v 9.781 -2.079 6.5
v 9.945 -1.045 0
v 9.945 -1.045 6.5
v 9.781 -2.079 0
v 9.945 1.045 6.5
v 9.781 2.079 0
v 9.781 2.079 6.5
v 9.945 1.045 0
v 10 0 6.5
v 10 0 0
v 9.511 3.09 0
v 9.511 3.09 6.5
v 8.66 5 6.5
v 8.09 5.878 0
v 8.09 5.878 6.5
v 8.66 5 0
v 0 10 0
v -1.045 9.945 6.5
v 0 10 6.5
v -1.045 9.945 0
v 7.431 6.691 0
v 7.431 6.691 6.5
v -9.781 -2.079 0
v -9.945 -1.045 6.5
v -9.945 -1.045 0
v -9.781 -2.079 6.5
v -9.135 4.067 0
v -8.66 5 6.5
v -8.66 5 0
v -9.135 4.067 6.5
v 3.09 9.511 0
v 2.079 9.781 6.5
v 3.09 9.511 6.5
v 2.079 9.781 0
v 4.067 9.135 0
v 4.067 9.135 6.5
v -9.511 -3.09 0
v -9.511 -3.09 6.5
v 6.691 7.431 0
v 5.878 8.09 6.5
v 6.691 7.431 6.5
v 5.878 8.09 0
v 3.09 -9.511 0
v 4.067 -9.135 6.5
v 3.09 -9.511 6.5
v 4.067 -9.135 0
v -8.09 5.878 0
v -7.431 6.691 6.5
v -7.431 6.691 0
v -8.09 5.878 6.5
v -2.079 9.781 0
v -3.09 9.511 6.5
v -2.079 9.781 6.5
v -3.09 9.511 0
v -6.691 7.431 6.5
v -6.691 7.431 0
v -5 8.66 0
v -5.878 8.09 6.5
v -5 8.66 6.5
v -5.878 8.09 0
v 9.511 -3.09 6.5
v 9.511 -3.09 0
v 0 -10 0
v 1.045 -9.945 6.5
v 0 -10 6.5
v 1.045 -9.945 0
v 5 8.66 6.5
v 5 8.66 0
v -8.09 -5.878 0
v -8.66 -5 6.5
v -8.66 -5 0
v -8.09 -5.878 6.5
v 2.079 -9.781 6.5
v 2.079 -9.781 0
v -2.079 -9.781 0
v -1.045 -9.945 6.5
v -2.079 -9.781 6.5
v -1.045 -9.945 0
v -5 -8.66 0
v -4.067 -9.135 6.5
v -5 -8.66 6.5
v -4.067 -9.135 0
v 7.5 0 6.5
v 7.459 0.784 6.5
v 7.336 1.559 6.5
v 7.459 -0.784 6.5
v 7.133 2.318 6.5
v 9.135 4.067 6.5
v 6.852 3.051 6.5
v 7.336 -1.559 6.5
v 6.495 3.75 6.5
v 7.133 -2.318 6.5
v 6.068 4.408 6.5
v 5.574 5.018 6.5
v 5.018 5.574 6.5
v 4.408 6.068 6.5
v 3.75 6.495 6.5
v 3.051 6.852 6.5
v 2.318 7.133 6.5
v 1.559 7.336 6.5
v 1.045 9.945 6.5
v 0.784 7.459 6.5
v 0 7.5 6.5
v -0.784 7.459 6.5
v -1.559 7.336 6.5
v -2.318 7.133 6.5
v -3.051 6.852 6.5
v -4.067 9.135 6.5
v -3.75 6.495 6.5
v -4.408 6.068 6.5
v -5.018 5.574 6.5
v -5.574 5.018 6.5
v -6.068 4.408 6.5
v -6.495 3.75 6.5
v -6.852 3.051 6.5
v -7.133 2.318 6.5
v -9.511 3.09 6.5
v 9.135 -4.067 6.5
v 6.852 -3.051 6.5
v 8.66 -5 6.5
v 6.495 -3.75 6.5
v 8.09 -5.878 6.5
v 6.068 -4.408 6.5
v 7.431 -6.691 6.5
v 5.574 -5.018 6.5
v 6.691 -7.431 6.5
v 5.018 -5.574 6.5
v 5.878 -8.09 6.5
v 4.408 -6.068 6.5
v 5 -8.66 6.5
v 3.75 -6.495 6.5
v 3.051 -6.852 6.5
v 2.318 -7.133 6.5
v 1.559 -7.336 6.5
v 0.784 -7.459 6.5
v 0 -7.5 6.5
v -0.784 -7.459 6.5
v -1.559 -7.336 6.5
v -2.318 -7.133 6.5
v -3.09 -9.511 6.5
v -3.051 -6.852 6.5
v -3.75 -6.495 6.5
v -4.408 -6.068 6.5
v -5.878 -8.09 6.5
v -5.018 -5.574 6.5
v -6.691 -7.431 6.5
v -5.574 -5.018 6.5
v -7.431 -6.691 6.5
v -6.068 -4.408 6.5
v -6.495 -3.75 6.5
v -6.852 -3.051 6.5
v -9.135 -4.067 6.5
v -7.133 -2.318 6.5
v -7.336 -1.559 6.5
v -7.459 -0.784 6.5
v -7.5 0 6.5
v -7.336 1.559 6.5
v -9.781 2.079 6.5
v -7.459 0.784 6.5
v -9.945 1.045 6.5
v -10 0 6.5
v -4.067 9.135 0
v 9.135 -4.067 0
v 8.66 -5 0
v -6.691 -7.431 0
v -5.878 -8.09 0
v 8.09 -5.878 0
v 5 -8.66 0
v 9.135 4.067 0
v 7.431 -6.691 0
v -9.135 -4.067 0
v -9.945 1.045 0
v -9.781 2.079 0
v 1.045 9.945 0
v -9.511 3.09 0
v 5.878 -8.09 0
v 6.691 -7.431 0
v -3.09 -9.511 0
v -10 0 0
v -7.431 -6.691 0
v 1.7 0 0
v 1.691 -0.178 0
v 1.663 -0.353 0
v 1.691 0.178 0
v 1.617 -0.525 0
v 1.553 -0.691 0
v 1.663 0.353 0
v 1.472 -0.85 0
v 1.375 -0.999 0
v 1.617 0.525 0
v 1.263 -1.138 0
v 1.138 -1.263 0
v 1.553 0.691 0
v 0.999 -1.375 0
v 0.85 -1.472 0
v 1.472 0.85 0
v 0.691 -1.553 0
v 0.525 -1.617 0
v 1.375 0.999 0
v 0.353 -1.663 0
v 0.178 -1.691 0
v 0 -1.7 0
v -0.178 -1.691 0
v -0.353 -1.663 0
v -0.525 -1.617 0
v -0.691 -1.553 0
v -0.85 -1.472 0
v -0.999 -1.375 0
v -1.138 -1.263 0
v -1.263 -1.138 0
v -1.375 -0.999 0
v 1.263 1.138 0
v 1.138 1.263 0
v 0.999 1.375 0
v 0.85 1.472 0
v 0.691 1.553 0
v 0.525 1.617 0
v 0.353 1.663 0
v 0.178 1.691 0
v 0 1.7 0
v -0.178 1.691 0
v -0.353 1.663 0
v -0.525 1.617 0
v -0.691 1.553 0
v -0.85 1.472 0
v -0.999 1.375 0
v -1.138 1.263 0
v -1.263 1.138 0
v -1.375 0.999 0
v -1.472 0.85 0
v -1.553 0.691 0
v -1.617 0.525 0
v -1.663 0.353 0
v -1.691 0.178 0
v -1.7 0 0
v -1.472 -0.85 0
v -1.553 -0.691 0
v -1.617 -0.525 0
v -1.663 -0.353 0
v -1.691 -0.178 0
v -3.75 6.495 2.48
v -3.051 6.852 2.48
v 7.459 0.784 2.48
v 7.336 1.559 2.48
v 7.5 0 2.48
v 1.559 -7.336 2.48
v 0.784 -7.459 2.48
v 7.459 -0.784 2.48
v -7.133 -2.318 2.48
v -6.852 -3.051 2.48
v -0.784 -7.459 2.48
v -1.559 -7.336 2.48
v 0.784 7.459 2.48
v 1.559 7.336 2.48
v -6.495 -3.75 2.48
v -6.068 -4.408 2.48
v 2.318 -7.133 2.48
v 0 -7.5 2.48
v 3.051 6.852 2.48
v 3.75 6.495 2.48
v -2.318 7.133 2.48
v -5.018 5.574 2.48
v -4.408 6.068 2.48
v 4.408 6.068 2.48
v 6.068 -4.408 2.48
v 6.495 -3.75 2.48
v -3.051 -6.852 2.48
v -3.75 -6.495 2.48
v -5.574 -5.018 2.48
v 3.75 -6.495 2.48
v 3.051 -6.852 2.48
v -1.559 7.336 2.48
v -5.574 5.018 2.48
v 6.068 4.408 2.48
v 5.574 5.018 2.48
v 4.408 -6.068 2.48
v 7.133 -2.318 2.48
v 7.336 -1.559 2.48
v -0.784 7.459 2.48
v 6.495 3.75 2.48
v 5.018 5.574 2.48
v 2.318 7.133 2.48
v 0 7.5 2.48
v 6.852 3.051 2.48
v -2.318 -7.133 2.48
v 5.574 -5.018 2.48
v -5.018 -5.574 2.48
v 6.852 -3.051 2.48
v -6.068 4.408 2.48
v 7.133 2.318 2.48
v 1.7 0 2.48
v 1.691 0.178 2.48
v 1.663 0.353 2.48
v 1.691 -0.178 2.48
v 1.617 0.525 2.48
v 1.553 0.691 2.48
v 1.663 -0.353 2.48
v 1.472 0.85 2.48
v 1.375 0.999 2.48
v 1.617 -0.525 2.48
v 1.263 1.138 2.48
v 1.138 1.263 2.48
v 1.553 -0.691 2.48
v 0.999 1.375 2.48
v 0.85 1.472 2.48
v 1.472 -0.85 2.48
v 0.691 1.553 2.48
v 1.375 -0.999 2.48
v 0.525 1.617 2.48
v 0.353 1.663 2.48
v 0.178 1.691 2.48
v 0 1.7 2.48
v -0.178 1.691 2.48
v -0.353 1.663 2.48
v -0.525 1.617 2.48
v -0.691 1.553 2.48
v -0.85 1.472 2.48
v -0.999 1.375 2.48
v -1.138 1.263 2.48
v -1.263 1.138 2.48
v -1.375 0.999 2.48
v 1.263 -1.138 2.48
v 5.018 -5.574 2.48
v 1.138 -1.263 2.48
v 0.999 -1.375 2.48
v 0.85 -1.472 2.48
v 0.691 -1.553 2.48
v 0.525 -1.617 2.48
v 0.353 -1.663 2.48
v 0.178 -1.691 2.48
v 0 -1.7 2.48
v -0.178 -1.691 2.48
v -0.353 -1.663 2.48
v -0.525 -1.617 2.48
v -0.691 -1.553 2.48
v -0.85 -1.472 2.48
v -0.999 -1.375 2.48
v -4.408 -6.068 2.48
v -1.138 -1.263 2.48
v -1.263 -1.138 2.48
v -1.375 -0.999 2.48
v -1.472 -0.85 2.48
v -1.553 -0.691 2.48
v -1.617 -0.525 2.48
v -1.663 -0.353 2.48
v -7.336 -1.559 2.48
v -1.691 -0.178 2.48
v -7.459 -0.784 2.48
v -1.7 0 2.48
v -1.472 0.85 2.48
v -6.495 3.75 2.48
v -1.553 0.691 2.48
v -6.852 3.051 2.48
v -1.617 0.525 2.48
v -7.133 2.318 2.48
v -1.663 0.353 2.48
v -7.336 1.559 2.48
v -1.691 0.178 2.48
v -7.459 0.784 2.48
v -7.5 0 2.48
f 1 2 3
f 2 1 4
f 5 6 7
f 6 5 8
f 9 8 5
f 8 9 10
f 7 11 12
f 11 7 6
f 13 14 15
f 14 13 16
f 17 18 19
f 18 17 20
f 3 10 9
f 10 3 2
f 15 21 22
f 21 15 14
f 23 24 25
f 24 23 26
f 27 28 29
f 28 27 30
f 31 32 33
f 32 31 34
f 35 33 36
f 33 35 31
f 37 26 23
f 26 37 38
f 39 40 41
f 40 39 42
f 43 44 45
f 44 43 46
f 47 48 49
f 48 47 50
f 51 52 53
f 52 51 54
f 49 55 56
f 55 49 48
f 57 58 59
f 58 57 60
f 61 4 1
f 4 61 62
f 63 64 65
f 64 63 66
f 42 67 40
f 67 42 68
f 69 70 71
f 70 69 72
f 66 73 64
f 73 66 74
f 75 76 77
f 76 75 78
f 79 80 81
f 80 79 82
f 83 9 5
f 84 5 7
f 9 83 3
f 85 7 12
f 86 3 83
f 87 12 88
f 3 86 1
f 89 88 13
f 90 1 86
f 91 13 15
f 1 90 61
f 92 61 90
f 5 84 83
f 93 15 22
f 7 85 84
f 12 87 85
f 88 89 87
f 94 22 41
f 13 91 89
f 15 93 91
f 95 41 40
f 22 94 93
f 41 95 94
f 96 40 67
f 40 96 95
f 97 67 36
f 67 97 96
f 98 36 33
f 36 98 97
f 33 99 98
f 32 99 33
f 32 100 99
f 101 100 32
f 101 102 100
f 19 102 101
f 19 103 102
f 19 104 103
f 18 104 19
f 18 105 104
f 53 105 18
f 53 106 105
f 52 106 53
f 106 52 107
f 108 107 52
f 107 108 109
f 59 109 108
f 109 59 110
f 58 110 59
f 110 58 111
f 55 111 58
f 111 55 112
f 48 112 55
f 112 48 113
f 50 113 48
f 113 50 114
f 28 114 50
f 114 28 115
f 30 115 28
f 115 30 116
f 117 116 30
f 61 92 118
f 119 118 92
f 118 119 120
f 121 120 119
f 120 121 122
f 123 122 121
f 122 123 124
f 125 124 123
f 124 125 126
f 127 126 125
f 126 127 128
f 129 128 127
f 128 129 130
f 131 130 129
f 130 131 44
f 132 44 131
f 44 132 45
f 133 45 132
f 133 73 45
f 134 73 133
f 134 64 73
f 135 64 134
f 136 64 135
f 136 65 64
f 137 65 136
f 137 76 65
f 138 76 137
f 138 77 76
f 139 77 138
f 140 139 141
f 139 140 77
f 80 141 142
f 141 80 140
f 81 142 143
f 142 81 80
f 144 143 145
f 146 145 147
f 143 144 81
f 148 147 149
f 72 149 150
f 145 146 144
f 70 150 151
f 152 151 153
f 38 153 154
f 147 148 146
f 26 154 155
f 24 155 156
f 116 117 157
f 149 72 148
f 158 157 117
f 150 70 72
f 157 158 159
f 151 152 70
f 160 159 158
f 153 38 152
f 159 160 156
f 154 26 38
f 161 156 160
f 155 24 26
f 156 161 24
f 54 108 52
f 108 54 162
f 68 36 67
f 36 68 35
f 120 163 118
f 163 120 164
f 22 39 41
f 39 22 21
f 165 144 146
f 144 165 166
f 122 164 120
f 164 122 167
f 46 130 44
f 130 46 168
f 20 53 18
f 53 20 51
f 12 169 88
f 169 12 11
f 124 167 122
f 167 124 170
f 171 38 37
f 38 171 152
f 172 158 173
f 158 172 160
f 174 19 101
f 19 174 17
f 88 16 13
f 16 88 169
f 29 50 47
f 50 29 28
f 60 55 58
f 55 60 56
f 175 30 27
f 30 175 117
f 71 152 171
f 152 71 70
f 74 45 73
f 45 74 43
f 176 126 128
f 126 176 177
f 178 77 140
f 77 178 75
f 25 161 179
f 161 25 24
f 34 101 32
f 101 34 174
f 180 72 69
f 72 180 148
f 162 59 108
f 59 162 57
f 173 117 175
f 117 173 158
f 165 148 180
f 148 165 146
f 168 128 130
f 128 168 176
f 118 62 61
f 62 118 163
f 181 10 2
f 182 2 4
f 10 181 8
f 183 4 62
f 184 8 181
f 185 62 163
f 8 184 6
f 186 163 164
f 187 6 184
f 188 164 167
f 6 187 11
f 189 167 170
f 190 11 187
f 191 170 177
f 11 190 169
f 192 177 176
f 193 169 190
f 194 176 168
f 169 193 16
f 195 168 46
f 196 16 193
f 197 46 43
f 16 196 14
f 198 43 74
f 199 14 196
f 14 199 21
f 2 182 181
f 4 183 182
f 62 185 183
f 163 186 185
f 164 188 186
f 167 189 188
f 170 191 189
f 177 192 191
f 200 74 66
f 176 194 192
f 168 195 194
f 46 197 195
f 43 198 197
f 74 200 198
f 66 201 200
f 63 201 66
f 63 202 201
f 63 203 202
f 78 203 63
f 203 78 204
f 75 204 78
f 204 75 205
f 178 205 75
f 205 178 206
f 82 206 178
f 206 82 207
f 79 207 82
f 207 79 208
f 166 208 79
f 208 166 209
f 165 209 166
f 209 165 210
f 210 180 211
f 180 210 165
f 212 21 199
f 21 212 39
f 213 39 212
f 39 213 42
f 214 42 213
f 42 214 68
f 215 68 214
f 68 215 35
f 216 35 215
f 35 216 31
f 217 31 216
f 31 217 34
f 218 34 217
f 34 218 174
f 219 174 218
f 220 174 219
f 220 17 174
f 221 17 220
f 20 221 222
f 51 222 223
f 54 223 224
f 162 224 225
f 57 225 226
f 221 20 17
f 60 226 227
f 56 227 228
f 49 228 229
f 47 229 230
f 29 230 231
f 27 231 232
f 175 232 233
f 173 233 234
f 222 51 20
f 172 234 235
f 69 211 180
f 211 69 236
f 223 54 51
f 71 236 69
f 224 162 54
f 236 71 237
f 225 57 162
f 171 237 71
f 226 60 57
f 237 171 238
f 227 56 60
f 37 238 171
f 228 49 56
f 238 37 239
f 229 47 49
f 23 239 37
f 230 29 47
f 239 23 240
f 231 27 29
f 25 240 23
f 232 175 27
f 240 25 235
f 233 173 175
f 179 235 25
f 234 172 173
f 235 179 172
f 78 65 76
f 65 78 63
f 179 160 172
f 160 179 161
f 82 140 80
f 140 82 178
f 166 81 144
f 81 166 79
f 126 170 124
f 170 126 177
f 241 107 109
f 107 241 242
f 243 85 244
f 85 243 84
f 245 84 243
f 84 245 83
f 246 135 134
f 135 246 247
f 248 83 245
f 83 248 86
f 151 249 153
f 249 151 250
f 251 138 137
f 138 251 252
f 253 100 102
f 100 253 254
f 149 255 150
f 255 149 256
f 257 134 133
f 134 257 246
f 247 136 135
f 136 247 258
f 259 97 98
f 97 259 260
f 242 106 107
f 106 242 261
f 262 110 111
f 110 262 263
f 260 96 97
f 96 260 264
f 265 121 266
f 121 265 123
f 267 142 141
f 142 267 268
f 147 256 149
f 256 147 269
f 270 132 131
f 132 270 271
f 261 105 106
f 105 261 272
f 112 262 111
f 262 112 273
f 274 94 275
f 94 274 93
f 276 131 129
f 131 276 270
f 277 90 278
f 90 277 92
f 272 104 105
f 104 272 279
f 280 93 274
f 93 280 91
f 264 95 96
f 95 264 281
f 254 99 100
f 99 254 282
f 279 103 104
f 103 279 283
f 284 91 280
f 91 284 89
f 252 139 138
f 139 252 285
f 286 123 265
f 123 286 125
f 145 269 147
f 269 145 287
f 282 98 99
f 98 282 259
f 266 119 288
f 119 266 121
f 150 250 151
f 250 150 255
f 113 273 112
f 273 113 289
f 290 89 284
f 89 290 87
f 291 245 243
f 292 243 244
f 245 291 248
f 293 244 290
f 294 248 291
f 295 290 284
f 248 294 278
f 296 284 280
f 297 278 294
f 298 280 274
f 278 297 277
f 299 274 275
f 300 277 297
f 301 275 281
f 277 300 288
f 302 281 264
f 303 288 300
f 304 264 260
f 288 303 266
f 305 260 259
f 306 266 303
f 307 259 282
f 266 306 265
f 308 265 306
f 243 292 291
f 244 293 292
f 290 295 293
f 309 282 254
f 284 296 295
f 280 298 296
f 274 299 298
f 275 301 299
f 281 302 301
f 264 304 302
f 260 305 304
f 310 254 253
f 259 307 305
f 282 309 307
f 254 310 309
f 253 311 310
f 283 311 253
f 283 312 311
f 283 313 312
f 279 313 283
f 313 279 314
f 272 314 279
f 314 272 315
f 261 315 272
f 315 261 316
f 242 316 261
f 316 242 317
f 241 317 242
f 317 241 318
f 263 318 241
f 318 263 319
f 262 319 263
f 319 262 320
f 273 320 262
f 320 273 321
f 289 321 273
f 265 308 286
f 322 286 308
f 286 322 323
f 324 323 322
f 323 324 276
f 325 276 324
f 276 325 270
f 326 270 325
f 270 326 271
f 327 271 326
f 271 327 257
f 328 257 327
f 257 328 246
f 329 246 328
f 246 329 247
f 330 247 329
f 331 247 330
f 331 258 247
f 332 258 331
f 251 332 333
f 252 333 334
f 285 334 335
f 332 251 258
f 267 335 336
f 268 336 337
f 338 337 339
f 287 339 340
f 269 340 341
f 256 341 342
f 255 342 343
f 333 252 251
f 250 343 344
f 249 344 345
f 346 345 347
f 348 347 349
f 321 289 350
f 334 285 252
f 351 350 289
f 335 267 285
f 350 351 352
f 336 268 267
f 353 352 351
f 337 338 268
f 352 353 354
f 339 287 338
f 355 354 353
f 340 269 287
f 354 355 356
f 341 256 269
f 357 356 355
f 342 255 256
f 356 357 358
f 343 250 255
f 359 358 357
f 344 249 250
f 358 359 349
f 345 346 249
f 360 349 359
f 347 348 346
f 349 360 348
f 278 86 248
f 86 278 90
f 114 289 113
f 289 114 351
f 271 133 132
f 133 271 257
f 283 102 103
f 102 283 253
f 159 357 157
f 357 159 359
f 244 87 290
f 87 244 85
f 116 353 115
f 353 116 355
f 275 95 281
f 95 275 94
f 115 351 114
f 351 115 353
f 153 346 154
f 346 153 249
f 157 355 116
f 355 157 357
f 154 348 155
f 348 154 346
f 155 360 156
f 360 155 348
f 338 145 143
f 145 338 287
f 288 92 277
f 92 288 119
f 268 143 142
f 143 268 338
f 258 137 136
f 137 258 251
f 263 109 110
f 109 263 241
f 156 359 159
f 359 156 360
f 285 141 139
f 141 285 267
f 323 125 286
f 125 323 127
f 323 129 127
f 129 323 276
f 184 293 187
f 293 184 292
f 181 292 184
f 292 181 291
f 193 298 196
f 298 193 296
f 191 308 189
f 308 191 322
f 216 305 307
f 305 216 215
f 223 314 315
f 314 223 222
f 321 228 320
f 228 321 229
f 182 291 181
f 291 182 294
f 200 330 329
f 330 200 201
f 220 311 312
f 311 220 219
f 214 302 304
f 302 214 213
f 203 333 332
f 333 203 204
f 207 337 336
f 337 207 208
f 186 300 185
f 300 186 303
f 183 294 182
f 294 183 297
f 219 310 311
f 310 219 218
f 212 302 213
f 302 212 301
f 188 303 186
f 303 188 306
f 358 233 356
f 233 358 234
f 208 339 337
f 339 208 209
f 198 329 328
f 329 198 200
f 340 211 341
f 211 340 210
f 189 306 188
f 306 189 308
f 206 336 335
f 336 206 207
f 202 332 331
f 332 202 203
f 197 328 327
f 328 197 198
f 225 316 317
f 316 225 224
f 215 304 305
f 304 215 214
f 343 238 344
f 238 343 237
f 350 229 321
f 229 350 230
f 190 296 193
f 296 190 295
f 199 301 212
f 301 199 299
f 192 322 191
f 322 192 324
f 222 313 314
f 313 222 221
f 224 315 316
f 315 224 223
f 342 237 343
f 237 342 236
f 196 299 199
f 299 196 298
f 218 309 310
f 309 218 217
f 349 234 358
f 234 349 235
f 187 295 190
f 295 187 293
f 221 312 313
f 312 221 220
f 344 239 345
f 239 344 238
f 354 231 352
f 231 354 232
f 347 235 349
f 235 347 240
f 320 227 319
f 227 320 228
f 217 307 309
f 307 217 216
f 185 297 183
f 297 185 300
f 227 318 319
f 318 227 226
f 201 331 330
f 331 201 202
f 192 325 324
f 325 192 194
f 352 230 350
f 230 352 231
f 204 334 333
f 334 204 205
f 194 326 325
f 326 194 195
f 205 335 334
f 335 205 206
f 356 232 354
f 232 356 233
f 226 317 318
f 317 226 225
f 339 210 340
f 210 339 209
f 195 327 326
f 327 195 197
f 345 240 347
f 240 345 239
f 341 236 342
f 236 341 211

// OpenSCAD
// Recessed magnet cup.
$fn = 60;
eps = 0.02;
magnet_d = 15;
wall = 2.5;
outer_d = magnet_d+2*wall;
height = wall+4;
difference() {
    cylinder(d=outer_d,h=height);
    translate([0,0,wall-eps]) cylinder(d=magnet_d,h=height-wall+2*eps);
    translate([0,0,-eps]) cylinder(d=3.4,h=wall+2*eps);
}
